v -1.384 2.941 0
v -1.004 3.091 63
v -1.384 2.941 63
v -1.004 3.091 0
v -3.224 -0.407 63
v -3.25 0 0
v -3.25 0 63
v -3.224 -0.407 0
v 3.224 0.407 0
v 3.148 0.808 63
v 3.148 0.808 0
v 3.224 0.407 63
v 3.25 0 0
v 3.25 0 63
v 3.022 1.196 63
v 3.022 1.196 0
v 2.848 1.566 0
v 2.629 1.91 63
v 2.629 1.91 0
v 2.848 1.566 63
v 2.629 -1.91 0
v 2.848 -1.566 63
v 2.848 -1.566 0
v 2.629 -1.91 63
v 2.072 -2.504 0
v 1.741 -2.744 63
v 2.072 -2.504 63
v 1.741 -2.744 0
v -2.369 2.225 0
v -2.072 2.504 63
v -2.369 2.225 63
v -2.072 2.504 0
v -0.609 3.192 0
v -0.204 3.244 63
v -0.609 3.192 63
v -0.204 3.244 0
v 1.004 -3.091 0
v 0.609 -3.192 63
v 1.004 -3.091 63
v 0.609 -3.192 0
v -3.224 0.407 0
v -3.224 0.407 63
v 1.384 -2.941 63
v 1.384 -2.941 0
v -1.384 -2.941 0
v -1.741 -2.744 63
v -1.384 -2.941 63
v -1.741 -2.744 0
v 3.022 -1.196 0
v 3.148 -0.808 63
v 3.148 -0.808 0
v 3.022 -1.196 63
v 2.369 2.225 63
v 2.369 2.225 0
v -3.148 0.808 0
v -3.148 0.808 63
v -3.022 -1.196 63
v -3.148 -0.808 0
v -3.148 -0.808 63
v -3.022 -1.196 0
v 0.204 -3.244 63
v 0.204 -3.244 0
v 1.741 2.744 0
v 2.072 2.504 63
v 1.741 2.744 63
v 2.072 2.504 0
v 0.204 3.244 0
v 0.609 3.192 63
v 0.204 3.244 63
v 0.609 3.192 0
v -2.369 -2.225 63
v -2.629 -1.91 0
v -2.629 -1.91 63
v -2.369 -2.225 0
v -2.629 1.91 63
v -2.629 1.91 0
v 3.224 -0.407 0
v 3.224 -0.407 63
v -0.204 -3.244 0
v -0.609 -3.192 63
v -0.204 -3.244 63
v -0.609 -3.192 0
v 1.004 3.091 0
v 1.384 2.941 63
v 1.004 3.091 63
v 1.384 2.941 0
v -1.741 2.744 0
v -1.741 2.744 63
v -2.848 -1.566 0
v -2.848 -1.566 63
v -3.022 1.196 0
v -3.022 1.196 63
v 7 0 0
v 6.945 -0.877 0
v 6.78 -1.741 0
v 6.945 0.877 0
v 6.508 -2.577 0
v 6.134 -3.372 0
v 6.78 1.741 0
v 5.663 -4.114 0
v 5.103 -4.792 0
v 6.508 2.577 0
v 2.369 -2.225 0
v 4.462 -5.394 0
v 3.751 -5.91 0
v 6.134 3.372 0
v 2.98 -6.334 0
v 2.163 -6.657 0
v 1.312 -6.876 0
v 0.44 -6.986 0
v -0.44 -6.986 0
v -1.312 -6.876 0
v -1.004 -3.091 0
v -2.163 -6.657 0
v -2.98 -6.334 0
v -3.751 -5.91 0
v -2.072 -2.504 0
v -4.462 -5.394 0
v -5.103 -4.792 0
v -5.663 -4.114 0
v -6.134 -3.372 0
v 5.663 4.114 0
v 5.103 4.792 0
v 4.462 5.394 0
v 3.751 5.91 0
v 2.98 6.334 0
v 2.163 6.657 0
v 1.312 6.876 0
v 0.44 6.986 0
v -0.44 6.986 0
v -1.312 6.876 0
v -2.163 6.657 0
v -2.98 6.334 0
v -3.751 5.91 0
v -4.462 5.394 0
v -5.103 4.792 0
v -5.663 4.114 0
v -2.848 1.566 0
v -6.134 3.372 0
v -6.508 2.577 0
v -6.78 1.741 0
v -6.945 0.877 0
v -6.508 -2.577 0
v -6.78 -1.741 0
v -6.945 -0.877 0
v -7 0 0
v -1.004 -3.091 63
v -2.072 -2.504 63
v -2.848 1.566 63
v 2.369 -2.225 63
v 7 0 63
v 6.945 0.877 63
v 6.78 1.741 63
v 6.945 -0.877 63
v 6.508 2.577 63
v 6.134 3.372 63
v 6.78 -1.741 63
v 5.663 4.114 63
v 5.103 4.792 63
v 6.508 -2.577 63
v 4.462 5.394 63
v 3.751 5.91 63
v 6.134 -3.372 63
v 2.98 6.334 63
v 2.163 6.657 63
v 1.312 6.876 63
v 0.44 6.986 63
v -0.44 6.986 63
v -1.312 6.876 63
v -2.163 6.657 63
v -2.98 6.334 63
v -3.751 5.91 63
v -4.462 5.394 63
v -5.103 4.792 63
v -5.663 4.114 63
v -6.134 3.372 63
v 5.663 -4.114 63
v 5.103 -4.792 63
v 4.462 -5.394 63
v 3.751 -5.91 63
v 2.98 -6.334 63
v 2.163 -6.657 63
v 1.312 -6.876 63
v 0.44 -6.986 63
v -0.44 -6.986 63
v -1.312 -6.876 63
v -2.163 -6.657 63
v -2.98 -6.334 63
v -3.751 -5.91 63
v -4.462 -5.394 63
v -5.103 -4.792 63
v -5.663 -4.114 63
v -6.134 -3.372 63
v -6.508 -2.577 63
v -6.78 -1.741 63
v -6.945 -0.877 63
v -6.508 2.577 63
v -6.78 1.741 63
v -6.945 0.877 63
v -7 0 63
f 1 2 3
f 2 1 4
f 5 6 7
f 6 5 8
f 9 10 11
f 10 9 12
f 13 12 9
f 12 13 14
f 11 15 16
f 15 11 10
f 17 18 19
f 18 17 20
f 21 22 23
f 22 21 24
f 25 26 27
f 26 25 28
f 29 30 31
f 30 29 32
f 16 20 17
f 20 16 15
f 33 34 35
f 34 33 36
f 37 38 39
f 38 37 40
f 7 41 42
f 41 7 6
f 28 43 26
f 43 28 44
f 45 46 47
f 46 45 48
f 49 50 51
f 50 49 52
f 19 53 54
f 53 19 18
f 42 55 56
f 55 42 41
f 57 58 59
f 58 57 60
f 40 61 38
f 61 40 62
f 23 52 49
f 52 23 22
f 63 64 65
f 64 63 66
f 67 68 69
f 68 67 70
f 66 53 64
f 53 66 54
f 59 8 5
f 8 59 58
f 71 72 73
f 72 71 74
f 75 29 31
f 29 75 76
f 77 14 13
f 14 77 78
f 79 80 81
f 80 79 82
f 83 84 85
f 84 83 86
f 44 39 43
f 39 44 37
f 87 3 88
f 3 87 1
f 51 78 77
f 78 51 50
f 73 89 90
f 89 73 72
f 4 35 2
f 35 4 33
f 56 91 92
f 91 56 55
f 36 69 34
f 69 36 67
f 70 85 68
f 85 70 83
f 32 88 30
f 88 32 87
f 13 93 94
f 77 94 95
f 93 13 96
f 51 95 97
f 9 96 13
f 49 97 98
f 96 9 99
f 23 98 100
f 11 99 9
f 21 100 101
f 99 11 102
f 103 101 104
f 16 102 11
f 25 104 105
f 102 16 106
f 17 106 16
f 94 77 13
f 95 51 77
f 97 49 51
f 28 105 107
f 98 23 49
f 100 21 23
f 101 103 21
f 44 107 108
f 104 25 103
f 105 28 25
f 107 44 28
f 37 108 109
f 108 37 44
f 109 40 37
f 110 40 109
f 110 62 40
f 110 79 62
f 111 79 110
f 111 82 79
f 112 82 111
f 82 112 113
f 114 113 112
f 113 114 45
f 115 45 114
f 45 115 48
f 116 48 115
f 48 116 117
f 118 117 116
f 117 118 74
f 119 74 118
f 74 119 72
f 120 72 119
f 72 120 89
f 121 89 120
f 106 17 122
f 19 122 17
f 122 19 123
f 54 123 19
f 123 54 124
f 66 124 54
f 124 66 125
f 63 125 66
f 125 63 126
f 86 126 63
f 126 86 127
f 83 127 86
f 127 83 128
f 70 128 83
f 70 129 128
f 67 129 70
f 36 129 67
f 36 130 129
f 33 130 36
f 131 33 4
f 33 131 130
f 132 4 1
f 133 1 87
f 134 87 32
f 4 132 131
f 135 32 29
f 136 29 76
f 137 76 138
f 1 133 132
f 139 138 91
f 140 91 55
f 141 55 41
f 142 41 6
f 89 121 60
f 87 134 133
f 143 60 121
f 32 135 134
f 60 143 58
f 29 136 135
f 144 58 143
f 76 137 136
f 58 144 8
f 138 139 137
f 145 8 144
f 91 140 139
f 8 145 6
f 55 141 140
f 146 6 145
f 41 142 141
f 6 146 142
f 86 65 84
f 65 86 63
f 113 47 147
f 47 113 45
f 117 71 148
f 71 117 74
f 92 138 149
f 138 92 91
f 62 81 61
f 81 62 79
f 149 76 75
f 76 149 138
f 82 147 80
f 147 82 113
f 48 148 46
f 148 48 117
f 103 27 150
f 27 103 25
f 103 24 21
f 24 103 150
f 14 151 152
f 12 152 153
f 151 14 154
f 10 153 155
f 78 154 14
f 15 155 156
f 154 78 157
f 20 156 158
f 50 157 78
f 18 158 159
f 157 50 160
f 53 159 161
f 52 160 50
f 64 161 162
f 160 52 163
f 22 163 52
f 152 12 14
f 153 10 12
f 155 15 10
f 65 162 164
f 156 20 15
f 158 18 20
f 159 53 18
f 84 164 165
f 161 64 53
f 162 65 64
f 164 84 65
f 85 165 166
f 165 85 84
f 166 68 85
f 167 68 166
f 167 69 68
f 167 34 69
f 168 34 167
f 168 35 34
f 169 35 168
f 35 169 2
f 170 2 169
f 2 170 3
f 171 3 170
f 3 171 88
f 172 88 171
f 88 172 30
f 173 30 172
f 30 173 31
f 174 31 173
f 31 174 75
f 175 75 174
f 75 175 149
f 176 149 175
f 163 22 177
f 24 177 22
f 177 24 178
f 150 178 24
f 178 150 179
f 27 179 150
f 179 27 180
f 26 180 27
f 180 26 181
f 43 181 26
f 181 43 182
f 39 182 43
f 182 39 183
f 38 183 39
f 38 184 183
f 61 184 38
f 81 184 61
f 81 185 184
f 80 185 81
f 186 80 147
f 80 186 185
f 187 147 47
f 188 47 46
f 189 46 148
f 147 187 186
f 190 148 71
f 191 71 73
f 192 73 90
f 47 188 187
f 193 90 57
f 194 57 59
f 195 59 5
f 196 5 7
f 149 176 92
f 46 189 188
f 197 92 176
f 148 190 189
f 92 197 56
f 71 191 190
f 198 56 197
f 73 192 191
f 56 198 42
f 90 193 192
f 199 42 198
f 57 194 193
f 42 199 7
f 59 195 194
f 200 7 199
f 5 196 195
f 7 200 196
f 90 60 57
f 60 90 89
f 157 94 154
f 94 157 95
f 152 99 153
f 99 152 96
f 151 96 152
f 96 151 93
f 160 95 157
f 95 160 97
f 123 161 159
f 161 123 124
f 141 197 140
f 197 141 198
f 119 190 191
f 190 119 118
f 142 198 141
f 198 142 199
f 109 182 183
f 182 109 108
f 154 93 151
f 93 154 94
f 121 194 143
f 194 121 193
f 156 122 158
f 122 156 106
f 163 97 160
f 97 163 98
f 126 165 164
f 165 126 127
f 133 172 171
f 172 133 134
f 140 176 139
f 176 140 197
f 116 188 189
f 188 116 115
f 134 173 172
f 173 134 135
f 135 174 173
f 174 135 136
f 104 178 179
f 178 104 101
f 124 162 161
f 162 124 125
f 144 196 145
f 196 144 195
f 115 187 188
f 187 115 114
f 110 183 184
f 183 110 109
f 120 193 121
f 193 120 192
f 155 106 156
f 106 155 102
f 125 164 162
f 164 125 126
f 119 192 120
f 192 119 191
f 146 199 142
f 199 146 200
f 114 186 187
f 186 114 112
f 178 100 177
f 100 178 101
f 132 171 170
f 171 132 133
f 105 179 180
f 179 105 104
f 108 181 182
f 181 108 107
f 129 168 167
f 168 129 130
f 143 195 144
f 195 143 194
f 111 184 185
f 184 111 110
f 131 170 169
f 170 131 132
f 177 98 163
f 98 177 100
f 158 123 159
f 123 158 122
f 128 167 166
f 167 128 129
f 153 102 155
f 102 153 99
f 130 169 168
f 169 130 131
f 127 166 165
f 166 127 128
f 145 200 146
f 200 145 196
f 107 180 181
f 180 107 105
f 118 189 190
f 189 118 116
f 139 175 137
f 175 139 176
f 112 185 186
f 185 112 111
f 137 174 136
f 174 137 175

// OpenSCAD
$fn = 50;


difference() {
	union() {
		cylinder(h = 63, r = 7.0000000000);
	}
	union() {
		cylinder(h = 63, r = 3.2500000000);
		cylinder(h = 63, r = 1.8000000000);
		cylinder(h = 63, r = 1.8000000000);
		cylinder(h = 63, r = 1.8000000000);
	}
}
